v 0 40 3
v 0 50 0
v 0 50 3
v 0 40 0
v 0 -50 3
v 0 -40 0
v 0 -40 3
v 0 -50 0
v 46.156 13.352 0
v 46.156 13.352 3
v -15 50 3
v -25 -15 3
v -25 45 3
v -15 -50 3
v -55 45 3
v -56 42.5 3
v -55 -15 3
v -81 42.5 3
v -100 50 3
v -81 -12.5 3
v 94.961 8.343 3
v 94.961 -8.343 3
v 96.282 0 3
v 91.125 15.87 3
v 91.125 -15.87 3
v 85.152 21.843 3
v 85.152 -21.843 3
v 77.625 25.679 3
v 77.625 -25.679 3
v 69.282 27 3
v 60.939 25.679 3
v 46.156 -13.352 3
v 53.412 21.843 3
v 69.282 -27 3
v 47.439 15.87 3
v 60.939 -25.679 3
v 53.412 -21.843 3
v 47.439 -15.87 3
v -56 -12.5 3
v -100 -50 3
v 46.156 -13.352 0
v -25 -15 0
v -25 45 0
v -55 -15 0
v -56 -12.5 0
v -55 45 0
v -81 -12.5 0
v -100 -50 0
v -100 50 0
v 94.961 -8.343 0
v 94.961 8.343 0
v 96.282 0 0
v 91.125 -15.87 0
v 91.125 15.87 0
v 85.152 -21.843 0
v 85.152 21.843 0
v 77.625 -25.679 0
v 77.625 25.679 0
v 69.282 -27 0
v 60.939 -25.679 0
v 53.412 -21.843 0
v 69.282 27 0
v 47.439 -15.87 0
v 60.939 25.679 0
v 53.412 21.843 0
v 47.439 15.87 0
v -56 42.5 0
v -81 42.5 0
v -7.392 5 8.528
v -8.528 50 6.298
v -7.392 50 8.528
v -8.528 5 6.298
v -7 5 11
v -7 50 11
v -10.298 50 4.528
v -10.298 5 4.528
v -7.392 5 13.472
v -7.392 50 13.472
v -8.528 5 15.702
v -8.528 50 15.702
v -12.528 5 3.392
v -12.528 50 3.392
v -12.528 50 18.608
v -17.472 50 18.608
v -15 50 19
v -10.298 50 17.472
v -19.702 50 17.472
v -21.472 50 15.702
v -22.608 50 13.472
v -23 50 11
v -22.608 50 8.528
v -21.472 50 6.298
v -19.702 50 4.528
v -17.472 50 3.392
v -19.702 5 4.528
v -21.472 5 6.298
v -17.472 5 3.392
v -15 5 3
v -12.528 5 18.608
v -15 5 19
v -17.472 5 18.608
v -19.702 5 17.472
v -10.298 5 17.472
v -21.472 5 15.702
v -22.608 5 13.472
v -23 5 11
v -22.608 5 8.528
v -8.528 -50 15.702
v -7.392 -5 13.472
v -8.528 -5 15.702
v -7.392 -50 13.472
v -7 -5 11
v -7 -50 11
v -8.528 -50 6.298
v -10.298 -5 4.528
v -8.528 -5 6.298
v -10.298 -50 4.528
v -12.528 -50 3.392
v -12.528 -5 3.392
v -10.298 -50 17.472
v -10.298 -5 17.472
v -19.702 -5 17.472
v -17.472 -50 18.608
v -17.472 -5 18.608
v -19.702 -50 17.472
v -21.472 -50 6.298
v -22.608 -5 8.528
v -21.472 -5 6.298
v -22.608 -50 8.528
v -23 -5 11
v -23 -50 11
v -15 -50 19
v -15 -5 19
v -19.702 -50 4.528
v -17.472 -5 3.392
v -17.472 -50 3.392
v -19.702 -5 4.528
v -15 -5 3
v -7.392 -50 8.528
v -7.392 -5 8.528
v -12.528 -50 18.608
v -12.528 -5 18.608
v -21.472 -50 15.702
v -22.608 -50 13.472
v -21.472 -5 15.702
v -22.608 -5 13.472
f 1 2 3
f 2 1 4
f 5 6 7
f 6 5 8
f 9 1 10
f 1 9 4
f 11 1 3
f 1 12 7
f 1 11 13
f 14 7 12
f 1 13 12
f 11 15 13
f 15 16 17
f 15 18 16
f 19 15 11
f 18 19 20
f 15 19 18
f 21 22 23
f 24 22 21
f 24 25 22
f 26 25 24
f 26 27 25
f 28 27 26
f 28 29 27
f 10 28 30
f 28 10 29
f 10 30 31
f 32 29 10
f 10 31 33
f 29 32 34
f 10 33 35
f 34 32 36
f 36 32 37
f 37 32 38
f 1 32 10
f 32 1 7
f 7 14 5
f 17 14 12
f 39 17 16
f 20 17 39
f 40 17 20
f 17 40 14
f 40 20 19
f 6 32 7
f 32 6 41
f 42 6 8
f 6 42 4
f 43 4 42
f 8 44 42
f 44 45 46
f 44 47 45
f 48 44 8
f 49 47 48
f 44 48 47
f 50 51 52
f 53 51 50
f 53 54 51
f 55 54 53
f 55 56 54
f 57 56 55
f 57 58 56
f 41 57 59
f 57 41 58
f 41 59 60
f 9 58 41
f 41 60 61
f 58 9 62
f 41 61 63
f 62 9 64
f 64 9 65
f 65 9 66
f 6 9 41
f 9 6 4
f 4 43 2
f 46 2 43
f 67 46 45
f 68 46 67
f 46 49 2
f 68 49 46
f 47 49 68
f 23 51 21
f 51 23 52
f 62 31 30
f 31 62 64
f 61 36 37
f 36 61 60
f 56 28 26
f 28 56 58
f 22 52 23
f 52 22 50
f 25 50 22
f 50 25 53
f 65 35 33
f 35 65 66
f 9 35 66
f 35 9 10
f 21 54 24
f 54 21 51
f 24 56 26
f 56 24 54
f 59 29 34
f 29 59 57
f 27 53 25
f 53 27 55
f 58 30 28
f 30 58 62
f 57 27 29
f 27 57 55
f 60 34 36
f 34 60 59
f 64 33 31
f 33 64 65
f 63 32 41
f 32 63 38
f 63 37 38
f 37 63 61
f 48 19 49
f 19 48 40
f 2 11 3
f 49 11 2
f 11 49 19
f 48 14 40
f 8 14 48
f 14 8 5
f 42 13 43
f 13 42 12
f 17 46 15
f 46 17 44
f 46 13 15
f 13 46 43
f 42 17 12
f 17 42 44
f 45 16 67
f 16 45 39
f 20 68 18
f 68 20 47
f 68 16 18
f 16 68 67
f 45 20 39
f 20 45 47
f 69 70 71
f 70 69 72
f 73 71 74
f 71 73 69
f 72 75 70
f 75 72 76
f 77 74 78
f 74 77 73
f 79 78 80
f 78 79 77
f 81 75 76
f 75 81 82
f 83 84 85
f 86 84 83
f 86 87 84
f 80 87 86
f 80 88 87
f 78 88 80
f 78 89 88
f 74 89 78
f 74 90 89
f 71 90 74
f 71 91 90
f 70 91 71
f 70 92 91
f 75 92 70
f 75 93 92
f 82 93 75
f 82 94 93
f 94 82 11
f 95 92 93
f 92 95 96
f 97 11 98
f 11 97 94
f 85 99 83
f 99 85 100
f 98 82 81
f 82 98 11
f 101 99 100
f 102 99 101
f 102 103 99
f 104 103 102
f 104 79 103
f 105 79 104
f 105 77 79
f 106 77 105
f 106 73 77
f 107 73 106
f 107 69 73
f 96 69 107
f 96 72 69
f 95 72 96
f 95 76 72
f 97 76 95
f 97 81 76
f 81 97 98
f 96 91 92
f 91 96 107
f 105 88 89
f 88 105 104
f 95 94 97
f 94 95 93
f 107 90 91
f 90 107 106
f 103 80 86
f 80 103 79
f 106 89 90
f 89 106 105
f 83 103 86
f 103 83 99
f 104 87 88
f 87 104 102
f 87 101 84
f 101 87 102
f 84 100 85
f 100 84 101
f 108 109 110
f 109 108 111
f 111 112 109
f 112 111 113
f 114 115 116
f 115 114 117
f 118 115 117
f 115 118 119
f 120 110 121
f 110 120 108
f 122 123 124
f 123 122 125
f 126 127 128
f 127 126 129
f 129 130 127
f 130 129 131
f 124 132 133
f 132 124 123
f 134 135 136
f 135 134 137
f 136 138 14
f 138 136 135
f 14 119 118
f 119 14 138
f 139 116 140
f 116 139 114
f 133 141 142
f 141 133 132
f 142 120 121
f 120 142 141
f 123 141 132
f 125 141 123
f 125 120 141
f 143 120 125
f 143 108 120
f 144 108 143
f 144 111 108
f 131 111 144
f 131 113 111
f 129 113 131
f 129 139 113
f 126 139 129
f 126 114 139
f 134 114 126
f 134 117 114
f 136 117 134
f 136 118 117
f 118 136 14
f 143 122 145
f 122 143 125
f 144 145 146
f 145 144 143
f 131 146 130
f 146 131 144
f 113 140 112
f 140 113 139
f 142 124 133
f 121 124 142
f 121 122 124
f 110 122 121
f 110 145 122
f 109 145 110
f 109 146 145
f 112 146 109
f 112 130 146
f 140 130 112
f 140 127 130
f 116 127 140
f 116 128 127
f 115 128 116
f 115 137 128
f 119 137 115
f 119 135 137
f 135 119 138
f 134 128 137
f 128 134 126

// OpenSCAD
baseHeight = 3;

baseSide = 80;

trialgleSide = baseSide;
triangleRadius = trialgleSide / sqrt(3);
triangleApothem = trialgleSide * (sqrt(3)/6);
triangleHigh = trialgleSide * (sqrt(3)/2);

weaponRadious = 27;

batteryY = 60;
batteryX = 30;
batteryZ = baseHeight;

motorRadius = 8;
motorLongitude = 45;

rxY = 55;
rxX = 25;
rxZ = baseHeight;

difference()
{
	union()
	{
		translate([triangleApothem,0,0])
			cylinder(baseHeight, r=triangleRadius, $fn=3);		

		translate([triangleHigh,0,0]) 
			cylinder(baseHeight, r=weaponRadious, $fn=20);

		translate([-(baseSide/2)-10,0,baseHeight/2])
			cube([baseSide+20,baseSide+20,baseHeight], center = true);
	}
	//battery
	translate([-(batteryX/2)-25,15,baseHeight/2])
		cube([batteryX,batteryY,batteryZ], center = true);	

	//RX
	translate([-(rxX/2)-56,15,baseHeight/2])
		cube([rxX,rxY,rxZ], center = true);	
}
//motores
translate([-15,5,(motorRadius)+3])
	rotate(a=[-90, 0, 0]) 
		cylinder(motorLongitude, r=motorRadius, $fn=20);
translate([-15,-5,(motorRadius)+3])
	rotate(a=[90, 0, 0]) 
		cylinder(motorLongitude, r=motorRadius, $fn=20);
